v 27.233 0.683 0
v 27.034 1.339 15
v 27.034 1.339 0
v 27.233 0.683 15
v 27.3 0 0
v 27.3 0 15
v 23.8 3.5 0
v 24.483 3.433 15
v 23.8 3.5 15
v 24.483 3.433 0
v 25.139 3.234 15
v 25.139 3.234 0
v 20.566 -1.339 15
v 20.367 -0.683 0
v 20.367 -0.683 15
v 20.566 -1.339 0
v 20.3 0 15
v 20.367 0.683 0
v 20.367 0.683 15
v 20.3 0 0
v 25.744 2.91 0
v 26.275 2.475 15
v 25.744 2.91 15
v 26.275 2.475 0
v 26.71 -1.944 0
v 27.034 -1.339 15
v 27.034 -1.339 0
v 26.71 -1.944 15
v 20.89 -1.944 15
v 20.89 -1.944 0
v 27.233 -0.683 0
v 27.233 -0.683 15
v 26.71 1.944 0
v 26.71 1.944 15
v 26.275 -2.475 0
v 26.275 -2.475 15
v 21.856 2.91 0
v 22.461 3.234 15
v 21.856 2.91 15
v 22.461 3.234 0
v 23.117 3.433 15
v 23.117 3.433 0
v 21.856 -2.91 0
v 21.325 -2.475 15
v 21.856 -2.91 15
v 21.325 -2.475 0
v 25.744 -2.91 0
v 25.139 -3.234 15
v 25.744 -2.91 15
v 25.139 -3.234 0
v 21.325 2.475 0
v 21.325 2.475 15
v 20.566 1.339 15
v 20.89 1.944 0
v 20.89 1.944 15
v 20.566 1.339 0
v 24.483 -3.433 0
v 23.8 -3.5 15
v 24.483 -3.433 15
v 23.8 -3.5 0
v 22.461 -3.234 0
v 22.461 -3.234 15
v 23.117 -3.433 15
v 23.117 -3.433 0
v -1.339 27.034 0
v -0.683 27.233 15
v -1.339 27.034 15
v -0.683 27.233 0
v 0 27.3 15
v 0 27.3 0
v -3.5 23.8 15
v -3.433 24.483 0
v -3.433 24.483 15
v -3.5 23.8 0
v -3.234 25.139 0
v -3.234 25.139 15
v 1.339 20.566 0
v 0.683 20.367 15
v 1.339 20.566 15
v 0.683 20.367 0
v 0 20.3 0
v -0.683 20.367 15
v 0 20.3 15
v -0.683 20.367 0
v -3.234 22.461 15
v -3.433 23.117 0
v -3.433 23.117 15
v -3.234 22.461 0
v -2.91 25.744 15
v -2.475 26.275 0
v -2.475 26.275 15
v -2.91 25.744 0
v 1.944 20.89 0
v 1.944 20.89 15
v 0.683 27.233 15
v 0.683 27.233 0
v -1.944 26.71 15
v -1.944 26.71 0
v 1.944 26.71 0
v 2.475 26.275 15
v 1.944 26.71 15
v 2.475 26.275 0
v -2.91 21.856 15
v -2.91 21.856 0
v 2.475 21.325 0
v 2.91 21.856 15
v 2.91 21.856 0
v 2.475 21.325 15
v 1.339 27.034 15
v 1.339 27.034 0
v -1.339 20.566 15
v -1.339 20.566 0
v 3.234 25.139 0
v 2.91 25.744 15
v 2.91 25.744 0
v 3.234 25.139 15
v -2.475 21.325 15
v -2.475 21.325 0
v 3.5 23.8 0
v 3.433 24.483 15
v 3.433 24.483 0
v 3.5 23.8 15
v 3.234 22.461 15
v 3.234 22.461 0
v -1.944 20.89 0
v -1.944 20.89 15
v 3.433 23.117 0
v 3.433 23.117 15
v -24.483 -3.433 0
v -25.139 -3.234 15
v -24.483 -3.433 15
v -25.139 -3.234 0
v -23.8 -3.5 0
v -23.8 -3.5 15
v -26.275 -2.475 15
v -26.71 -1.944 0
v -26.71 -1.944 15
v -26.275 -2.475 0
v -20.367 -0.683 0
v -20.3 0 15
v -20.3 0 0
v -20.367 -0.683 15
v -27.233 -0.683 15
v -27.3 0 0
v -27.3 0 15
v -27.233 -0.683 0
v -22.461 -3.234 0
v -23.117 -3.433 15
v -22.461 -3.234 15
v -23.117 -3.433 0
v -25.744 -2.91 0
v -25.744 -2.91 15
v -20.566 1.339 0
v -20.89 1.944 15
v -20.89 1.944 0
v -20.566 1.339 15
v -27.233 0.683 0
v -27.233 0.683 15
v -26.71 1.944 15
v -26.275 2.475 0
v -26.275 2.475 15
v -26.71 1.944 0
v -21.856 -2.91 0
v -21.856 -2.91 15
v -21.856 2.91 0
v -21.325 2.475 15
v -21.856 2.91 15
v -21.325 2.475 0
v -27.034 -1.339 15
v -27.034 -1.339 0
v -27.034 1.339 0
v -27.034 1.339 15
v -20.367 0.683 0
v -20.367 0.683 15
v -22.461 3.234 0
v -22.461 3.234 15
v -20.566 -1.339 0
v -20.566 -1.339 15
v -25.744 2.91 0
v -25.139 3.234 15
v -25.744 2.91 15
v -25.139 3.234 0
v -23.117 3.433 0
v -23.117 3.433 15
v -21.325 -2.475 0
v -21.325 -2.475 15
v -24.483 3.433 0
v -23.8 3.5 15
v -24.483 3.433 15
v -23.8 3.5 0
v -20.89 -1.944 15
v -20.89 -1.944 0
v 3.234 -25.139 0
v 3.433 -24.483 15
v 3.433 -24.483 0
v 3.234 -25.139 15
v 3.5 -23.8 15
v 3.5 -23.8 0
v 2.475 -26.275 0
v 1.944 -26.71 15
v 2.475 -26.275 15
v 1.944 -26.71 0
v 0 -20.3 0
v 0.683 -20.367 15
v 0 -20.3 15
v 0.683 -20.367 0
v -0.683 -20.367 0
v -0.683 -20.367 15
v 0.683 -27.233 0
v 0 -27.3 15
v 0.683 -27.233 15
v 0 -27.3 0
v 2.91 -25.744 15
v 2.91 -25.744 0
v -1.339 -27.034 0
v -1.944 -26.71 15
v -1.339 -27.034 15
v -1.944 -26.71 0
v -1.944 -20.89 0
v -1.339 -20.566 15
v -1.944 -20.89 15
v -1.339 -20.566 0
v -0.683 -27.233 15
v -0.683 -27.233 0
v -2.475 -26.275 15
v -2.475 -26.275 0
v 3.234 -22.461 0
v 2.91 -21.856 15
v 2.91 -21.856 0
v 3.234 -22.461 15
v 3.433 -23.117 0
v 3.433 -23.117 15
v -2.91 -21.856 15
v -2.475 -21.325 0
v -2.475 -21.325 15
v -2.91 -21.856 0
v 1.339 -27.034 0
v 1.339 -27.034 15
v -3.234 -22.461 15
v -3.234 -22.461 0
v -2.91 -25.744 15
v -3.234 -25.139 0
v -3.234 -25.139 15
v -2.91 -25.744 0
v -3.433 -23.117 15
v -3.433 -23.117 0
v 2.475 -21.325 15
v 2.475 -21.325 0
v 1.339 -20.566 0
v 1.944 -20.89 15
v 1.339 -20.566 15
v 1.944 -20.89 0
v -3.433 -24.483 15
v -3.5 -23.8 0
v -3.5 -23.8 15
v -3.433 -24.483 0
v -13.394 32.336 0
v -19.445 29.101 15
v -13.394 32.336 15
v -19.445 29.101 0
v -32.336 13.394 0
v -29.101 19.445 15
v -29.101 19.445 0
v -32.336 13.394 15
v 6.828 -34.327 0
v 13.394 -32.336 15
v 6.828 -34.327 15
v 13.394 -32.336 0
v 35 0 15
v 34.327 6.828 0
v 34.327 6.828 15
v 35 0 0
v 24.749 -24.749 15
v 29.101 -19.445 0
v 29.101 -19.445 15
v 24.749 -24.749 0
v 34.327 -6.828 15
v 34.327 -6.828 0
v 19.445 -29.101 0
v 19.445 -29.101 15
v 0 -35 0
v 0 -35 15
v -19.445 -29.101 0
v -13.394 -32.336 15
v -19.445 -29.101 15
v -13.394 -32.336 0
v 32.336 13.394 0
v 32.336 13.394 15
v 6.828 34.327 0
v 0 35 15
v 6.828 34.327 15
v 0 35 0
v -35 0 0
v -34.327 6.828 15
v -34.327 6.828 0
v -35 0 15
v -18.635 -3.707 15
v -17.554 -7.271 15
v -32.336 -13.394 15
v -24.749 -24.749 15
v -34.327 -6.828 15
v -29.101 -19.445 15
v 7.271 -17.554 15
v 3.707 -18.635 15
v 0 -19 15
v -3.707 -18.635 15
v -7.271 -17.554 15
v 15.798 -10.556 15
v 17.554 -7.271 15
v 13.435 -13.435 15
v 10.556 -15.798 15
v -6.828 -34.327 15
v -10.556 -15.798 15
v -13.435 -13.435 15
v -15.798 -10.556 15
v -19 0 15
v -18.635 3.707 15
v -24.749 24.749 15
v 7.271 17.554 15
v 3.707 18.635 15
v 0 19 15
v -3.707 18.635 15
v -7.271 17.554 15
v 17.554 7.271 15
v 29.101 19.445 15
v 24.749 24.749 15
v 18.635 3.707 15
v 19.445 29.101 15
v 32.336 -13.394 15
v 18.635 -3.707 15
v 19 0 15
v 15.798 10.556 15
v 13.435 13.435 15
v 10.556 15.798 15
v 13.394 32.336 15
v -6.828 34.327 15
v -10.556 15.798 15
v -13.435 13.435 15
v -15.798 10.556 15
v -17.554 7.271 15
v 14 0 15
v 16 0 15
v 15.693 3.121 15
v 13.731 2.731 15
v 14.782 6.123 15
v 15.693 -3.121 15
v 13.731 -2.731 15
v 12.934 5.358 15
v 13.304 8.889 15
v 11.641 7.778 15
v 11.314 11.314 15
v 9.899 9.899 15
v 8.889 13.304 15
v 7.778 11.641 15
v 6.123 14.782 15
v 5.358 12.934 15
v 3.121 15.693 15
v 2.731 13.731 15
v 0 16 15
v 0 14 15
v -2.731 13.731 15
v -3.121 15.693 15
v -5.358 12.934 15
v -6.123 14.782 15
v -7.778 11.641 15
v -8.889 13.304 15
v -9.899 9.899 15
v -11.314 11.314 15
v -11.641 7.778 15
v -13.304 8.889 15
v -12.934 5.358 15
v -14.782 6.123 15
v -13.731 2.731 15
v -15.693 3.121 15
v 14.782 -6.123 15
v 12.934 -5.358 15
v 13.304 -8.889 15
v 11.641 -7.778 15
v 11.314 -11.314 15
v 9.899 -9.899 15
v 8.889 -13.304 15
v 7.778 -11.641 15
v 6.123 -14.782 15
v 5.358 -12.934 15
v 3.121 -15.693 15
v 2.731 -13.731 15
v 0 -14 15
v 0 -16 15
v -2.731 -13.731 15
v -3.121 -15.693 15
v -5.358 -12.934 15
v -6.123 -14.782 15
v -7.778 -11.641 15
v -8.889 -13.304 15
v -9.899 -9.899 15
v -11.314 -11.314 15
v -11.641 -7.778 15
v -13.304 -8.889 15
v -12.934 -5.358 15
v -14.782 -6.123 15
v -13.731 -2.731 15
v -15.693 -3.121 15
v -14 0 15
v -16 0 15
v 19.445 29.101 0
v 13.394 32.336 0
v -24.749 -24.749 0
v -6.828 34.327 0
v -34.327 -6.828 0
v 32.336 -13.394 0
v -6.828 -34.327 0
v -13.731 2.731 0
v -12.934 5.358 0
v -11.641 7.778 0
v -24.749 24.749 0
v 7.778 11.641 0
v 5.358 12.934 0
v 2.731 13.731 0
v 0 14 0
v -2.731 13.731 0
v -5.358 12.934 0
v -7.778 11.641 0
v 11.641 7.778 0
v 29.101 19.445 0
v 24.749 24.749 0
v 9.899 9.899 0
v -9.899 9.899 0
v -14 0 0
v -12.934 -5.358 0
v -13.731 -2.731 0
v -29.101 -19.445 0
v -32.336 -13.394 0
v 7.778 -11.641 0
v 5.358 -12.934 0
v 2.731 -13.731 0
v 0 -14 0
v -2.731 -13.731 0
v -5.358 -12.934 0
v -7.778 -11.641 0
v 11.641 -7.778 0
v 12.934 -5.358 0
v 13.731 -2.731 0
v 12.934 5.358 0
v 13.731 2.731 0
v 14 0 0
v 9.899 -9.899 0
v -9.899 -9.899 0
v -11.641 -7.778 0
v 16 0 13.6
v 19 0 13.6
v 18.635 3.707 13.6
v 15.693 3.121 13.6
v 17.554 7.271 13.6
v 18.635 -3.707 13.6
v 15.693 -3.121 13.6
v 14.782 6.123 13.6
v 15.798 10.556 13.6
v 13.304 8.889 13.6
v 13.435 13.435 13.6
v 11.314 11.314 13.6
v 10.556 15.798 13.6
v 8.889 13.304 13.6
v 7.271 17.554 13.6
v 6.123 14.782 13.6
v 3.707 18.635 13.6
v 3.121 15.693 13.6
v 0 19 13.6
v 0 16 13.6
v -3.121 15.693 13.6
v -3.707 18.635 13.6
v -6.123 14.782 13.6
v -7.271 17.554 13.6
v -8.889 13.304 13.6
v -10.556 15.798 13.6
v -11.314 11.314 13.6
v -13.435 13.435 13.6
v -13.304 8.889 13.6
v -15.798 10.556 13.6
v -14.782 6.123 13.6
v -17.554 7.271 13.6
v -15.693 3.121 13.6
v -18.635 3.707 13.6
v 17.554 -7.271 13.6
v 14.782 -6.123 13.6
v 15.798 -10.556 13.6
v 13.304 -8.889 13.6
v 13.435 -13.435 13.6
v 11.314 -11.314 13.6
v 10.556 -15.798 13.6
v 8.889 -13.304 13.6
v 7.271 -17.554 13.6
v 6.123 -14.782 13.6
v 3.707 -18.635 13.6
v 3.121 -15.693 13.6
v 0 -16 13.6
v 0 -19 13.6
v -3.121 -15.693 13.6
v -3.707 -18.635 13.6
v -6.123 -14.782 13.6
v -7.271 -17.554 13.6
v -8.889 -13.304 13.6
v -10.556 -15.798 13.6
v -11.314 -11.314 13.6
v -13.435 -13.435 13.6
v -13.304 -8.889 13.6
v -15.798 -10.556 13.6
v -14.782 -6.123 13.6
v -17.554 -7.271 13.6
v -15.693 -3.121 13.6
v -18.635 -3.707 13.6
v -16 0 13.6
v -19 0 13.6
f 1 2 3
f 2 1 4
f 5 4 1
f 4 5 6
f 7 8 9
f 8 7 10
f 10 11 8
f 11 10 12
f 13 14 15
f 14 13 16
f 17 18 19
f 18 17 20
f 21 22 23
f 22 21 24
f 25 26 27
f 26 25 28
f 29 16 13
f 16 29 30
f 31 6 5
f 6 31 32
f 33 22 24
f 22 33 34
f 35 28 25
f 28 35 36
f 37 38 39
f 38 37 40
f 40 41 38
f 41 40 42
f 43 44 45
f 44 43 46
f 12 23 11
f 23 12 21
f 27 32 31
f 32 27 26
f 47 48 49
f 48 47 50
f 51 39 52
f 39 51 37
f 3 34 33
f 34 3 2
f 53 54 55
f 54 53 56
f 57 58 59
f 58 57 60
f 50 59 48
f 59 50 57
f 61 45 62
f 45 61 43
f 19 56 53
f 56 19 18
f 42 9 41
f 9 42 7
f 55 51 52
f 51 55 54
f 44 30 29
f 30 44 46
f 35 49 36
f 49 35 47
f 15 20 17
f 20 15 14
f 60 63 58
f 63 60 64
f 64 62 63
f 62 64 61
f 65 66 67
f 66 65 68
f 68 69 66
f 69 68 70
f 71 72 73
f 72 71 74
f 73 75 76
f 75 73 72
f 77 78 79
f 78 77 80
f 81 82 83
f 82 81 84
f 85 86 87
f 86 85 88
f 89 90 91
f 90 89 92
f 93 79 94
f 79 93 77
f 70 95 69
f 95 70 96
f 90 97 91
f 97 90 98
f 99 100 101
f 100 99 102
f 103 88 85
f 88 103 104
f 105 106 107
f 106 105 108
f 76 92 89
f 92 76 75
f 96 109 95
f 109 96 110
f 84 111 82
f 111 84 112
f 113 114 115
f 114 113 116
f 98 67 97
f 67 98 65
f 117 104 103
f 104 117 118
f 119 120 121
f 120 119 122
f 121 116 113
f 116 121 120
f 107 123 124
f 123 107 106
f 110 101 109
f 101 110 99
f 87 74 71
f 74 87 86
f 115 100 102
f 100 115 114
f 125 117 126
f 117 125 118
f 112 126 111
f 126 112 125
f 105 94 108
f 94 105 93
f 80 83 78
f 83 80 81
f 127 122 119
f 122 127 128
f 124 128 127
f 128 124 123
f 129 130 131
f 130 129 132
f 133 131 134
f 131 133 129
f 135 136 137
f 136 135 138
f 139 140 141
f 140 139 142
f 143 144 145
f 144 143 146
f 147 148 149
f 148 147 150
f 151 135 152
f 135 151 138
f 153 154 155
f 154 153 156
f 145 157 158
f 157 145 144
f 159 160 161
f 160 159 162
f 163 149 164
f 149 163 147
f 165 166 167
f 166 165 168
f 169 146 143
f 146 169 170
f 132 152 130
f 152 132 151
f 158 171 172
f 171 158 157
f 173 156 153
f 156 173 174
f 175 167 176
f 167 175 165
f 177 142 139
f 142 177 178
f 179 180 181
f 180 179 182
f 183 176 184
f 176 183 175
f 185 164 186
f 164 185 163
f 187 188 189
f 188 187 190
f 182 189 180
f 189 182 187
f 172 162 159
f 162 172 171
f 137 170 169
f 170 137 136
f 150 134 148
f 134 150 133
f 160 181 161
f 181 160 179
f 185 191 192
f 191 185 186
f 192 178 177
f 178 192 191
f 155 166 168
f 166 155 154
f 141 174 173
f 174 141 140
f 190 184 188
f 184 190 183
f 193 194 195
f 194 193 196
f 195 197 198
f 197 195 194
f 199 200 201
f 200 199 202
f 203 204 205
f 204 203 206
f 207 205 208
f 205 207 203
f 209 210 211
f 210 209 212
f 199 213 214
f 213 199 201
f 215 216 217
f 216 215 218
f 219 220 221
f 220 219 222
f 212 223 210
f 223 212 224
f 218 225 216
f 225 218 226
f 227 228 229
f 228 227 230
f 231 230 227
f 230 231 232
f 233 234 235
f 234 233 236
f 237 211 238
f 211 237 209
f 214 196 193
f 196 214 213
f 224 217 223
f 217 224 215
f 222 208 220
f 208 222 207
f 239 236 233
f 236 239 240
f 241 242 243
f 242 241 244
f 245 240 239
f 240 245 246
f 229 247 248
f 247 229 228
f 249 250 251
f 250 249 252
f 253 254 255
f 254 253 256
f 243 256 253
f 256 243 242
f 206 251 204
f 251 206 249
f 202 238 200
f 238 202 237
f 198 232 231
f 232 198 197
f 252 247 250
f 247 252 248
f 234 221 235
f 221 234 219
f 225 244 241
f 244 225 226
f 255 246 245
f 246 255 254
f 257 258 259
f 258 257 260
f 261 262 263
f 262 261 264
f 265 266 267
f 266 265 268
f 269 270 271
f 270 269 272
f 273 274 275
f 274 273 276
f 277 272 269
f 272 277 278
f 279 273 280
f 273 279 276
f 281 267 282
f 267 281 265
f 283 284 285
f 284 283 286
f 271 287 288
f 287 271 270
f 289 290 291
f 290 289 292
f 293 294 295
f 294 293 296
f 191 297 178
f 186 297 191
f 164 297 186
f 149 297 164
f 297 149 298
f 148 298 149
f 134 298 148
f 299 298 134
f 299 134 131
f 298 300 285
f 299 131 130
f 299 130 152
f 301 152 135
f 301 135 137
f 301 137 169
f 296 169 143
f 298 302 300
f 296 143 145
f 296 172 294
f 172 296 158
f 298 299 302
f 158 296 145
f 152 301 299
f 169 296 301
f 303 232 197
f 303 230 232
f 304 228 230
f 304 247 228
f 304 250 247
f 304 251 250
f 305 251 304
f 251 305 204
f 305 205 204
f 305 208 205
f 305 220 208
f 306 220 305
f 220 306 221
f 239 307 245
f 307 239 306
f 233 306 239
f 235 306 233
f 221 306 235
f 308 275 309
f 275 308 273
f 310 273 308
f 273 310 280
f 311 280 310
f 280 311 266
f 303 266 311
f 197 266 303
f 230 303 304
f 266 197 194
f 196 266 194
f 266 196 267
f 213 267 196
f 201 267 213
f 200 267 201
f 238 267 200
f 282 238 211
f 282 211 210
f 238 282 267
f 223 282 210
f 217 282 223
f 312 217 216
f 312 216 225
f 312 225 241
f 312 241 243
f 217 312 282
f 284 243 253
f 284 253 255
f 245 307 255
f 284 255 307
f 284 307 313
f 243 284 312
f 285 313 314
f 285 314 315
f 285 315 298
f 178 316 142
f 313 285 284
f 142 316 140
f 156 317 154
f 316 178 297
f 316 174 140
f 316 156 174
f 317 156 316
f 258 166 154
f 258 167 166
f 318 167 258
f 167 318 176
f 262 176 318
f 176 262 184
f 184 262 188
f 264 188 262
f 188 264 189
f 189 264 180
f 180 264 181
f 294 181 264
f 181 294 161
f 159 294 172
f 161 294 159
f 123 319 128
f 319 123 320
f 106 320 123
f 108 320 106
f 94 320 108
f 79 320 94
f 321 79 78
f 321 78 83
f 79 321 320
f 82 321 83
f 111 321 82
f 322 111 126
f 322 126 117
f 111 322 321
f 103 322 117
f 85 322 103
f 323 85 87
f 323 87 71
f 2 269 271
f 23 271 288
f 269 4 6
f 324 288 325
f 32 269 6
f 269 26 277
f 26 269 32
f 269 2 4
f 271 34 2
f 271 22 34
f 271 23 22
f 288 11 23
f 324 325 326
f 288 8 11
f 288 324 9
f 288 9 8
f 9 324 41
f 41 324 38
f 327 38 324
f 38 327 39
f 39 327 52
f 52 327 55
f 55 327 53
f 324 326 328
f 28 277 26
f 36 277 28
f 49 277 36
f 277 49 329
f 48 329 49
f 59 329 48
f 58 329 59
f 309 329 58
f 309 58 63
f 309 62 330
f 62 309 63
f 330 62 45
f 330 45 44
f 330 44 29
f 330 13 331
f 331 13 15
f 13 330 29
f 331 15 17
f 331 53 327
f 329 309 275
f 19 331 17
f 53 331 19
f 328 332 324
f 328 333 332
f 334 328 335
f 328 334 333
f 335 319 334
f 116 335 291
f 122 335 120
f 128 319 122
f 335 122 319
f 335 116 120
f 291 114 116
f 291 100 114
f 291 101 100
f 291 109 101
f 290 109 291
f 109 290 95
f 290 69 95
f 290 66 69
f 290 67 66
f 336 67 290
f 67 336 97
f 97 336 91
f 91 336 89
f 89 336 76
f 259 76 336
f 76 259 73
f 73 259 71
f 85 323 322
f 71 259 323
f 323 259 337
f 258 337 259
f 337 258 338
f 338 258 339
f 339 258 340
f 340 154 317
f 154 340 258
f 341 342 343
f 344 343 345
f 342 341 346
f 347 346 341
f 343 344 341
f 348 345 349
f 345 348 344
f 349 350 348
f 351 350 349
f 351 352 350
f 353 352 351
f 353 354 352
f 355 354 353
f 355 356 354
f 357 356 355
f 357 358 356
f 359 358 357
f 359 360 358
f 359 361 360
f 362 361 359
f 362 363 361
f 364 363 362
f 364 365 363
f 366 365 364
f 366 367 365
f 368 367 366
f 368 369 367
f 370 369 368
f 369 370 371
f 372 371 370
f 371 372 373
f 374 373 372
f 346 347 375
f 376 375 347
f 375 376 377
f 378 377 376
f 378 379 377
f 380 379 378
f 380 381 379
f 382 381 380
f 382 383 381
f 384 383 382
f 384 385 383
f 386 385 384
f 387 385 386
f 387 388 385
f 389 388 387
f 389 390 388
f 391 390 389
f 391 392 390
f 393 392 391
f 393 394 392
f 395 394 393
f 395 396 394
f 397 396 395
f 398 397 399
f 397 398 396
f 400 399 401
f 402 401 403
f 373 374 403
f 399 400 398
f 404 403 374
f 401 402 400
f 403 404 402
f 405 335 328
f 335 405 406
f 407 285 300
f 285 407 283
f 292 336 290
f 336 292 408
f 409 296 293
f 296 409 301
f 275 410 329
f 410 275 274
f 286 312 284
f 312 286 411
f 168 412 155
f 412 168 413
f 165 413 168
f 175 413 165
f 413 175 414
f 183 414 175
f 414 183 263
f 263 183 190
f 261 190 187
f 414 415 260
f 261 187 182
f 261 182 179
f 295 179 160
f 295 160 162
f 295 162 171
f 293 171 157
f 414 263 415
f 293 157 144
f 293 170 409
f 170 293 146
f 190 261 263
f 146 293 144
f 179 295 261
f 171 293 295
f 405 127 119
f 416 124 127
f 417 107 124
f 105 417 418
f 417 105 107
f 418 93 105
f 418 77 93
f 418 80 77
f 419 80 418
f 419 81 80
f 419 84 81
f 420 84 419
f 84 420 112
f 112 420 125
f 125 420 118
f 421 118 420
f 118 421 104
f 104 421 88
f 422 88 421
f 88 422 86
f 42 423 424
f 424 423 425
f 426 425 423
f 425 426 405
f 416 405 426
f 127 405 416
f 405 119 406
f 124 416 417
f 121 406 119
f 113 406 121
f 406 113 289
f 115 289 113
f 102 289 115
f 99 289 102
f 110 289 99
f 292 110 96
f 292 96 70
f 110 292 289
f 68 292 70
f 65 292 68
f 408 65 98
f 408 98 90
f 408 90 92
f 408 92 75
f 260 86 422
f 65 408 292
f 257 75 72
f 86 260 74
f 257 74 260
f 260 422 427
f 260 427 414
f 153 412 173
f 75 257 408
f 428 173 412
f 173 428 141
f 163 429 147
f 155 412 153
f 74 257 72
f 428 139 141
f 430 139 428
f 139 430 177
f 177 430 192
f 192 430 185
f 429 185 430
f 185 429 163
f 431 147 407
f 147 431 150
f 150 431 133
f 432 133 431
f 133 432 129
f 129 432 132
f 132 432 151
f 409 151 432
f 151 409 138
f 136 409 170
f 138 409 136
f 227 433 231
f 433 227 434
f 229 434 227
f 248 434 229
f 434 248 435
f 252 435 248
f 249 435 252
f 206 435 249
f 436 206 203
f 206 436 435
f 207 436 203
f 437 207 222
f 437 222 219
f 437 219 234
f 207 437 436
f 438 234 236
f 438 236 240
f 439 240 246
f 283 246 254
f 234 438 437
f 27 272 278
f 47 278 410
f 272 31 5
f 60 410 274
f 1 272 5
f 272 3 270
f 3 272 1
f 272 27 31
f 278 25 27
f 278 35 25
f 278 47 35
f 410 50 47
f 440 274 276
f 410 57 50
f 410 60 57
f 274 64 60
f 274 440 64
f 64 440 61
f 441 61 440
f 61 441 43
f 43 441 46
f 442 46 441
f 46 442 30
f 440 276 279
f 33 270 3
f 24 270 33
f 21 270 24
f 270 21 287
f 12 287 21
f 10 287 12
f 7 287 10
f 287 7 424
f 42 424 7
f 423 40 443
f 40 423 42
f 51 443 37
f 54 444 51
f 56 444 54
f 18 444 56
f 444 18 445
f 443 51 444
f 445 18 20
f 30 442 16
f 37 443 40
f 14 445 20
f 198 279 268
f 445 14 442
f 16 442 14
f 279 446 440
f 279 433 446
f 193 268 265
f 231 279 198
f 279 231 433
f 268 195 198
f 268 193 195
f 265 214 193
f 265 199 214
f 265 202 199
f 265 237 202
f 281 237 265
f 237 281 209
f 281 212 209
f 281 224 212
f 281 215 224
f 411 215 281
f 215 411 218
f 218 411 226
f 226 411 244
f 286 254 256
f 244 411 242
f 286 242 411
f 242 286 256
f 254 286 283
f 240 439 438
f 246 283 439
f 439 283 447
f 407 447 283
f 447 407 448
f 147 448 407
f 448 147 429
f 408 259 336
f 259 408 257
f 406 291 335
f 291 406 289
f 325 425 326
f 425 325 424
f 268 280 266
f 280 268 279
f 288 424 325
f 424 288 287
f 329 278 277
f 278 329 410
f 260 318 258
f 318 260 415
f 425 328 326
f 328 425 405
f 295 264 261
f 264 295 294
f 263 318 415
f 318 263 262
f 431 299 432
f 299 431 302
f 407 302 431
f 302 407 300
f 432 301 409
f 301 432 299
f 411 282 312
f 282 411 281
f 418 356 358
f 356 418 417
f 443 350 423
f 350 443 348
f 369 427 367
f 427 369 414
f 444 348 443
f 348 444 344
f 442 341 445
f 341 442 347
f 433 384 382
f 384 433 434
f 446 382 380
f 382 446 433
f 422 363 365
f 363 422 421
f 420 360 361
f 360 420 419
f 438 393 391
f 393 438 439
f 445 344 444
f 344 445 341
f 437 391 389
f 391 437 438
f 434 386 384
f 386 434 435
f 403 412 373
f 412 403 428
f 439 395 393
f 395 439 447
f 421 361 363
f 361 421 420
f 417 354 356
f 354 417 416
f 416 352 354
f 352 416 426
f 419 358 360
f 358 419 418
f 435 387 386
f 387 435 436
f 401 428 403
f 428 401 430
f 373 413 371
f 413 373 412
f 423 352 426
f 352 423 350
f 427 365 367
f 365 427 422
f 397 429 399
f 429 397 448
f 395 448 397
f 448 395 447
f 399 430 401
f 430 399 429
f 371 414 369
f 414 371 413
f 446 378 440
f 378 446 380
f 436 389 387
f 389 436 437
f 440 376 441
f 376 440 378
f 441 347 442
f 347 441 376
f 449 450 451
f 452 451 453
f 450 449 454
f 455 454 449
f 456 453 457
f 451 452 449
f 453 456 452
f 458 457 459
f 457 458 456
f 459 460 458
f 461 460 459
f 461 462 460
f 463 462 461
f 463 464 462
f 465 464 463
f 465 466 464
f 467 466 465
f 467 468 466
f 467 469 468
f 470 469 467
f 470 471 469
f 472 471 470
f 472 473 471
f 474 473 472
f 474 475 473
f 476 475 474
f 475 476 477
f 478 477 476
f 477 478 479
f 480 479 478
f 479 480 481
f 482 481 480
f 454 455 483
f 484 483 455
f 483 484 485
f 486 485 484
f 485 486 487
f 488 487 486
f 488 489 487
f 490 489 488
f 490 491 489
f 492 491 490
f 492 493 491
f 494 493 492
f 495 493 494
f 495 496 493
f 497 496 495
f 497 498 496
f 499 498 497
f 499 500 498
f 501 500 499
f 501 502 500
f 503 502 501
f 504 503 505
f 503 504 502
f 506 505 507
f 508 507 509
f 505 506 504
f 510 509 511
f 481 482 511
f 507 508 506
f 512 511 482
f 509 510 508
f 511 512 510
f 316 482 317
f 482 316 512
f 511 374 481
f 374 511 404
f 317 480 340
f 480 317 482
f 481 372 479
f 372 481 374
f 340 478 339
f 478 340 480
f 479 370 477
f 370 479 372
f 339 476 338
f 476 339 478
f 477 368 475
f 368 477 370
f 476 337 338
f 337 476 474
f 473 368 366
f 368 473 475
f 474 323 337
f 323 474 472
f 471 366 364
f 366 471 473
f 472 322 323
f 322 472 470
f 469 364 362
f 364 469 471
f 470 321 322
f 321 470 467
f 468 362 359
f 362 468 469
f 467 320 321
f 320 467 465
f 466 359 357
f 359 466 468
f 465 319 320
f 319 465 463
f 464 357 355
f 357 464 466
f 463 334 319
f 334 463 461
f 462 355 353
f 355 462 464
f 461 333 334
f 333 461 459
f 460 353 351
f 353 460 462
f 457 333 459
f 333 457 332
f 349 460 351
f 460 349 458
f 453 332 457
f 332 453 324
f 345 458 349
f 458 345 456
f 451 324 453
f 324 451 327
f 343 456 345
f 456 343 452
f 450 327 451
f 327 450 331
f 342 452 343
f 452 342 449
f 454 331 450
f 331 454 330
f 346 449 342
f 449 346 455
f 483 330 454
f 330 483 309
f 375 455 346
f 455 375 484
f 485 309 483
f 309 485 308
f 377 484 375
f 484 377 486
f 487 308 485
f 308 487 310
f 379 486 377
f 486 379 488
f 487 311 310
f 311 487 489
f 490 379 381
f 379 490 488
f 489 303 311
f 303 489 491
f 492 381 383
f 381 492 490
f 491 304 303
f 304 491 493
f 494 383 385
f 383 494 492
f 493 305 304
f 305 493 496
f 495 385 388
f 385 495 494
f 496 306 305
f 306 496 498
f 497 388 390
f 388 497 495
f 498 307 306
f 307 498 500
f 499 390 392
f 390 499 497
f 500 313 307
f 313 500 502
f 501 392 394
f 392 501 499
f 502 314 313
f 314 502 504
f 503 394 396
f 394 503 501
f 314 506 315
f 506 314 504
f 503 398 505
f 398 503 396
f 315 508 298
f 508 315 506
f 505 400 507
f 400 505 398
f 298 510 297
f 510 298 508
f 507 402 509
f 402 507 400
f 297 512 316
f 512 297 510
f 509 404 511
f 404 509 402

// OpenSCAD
$fn = 32;

// ----------------------------------------------------------------------
// Bolt-circle flange: 70 mm outside, 4 bolt holes, bore 28 mm
// ----------------------------------------------------------------------

// --- parameters (mm) ---
flange_d = 70;            // flange outside diameter
flange_t = 15;            // flange thickness
bolts = 4;                // number of bolt holes
bolt_d = 7;               // bolt clearance
bolt_r = 23.8;            // bolt circle radius
bore_d = 28;              // centre bore
groove_w = 3;             // gasket groove width
groove_d = 1.4;           // gasket groove depth
groove_r = 16;            // groove radius
groove_z = 13.6;          // groove floor depth from the face

module body() {
  cylinder(h = flange_t, d = flange_d);
}

difference() {
  body();
  /* bolt circle */
  for (i = [0 : bolts - 1]) rotate([0, 0, i * 360 / bolts]) translate([bolt_r, 0, -1]) cylinder(h = flange_t + 3, d = bolt_d);
  translate([0, 0, -1]) cylinder(h = flange_t + 3, d = bore_d);
  /* gasket groove on the front face */
  rotate_extrude() translate([groove_r, groove_z]) square([groove_w, groove_d + 1]);
}
